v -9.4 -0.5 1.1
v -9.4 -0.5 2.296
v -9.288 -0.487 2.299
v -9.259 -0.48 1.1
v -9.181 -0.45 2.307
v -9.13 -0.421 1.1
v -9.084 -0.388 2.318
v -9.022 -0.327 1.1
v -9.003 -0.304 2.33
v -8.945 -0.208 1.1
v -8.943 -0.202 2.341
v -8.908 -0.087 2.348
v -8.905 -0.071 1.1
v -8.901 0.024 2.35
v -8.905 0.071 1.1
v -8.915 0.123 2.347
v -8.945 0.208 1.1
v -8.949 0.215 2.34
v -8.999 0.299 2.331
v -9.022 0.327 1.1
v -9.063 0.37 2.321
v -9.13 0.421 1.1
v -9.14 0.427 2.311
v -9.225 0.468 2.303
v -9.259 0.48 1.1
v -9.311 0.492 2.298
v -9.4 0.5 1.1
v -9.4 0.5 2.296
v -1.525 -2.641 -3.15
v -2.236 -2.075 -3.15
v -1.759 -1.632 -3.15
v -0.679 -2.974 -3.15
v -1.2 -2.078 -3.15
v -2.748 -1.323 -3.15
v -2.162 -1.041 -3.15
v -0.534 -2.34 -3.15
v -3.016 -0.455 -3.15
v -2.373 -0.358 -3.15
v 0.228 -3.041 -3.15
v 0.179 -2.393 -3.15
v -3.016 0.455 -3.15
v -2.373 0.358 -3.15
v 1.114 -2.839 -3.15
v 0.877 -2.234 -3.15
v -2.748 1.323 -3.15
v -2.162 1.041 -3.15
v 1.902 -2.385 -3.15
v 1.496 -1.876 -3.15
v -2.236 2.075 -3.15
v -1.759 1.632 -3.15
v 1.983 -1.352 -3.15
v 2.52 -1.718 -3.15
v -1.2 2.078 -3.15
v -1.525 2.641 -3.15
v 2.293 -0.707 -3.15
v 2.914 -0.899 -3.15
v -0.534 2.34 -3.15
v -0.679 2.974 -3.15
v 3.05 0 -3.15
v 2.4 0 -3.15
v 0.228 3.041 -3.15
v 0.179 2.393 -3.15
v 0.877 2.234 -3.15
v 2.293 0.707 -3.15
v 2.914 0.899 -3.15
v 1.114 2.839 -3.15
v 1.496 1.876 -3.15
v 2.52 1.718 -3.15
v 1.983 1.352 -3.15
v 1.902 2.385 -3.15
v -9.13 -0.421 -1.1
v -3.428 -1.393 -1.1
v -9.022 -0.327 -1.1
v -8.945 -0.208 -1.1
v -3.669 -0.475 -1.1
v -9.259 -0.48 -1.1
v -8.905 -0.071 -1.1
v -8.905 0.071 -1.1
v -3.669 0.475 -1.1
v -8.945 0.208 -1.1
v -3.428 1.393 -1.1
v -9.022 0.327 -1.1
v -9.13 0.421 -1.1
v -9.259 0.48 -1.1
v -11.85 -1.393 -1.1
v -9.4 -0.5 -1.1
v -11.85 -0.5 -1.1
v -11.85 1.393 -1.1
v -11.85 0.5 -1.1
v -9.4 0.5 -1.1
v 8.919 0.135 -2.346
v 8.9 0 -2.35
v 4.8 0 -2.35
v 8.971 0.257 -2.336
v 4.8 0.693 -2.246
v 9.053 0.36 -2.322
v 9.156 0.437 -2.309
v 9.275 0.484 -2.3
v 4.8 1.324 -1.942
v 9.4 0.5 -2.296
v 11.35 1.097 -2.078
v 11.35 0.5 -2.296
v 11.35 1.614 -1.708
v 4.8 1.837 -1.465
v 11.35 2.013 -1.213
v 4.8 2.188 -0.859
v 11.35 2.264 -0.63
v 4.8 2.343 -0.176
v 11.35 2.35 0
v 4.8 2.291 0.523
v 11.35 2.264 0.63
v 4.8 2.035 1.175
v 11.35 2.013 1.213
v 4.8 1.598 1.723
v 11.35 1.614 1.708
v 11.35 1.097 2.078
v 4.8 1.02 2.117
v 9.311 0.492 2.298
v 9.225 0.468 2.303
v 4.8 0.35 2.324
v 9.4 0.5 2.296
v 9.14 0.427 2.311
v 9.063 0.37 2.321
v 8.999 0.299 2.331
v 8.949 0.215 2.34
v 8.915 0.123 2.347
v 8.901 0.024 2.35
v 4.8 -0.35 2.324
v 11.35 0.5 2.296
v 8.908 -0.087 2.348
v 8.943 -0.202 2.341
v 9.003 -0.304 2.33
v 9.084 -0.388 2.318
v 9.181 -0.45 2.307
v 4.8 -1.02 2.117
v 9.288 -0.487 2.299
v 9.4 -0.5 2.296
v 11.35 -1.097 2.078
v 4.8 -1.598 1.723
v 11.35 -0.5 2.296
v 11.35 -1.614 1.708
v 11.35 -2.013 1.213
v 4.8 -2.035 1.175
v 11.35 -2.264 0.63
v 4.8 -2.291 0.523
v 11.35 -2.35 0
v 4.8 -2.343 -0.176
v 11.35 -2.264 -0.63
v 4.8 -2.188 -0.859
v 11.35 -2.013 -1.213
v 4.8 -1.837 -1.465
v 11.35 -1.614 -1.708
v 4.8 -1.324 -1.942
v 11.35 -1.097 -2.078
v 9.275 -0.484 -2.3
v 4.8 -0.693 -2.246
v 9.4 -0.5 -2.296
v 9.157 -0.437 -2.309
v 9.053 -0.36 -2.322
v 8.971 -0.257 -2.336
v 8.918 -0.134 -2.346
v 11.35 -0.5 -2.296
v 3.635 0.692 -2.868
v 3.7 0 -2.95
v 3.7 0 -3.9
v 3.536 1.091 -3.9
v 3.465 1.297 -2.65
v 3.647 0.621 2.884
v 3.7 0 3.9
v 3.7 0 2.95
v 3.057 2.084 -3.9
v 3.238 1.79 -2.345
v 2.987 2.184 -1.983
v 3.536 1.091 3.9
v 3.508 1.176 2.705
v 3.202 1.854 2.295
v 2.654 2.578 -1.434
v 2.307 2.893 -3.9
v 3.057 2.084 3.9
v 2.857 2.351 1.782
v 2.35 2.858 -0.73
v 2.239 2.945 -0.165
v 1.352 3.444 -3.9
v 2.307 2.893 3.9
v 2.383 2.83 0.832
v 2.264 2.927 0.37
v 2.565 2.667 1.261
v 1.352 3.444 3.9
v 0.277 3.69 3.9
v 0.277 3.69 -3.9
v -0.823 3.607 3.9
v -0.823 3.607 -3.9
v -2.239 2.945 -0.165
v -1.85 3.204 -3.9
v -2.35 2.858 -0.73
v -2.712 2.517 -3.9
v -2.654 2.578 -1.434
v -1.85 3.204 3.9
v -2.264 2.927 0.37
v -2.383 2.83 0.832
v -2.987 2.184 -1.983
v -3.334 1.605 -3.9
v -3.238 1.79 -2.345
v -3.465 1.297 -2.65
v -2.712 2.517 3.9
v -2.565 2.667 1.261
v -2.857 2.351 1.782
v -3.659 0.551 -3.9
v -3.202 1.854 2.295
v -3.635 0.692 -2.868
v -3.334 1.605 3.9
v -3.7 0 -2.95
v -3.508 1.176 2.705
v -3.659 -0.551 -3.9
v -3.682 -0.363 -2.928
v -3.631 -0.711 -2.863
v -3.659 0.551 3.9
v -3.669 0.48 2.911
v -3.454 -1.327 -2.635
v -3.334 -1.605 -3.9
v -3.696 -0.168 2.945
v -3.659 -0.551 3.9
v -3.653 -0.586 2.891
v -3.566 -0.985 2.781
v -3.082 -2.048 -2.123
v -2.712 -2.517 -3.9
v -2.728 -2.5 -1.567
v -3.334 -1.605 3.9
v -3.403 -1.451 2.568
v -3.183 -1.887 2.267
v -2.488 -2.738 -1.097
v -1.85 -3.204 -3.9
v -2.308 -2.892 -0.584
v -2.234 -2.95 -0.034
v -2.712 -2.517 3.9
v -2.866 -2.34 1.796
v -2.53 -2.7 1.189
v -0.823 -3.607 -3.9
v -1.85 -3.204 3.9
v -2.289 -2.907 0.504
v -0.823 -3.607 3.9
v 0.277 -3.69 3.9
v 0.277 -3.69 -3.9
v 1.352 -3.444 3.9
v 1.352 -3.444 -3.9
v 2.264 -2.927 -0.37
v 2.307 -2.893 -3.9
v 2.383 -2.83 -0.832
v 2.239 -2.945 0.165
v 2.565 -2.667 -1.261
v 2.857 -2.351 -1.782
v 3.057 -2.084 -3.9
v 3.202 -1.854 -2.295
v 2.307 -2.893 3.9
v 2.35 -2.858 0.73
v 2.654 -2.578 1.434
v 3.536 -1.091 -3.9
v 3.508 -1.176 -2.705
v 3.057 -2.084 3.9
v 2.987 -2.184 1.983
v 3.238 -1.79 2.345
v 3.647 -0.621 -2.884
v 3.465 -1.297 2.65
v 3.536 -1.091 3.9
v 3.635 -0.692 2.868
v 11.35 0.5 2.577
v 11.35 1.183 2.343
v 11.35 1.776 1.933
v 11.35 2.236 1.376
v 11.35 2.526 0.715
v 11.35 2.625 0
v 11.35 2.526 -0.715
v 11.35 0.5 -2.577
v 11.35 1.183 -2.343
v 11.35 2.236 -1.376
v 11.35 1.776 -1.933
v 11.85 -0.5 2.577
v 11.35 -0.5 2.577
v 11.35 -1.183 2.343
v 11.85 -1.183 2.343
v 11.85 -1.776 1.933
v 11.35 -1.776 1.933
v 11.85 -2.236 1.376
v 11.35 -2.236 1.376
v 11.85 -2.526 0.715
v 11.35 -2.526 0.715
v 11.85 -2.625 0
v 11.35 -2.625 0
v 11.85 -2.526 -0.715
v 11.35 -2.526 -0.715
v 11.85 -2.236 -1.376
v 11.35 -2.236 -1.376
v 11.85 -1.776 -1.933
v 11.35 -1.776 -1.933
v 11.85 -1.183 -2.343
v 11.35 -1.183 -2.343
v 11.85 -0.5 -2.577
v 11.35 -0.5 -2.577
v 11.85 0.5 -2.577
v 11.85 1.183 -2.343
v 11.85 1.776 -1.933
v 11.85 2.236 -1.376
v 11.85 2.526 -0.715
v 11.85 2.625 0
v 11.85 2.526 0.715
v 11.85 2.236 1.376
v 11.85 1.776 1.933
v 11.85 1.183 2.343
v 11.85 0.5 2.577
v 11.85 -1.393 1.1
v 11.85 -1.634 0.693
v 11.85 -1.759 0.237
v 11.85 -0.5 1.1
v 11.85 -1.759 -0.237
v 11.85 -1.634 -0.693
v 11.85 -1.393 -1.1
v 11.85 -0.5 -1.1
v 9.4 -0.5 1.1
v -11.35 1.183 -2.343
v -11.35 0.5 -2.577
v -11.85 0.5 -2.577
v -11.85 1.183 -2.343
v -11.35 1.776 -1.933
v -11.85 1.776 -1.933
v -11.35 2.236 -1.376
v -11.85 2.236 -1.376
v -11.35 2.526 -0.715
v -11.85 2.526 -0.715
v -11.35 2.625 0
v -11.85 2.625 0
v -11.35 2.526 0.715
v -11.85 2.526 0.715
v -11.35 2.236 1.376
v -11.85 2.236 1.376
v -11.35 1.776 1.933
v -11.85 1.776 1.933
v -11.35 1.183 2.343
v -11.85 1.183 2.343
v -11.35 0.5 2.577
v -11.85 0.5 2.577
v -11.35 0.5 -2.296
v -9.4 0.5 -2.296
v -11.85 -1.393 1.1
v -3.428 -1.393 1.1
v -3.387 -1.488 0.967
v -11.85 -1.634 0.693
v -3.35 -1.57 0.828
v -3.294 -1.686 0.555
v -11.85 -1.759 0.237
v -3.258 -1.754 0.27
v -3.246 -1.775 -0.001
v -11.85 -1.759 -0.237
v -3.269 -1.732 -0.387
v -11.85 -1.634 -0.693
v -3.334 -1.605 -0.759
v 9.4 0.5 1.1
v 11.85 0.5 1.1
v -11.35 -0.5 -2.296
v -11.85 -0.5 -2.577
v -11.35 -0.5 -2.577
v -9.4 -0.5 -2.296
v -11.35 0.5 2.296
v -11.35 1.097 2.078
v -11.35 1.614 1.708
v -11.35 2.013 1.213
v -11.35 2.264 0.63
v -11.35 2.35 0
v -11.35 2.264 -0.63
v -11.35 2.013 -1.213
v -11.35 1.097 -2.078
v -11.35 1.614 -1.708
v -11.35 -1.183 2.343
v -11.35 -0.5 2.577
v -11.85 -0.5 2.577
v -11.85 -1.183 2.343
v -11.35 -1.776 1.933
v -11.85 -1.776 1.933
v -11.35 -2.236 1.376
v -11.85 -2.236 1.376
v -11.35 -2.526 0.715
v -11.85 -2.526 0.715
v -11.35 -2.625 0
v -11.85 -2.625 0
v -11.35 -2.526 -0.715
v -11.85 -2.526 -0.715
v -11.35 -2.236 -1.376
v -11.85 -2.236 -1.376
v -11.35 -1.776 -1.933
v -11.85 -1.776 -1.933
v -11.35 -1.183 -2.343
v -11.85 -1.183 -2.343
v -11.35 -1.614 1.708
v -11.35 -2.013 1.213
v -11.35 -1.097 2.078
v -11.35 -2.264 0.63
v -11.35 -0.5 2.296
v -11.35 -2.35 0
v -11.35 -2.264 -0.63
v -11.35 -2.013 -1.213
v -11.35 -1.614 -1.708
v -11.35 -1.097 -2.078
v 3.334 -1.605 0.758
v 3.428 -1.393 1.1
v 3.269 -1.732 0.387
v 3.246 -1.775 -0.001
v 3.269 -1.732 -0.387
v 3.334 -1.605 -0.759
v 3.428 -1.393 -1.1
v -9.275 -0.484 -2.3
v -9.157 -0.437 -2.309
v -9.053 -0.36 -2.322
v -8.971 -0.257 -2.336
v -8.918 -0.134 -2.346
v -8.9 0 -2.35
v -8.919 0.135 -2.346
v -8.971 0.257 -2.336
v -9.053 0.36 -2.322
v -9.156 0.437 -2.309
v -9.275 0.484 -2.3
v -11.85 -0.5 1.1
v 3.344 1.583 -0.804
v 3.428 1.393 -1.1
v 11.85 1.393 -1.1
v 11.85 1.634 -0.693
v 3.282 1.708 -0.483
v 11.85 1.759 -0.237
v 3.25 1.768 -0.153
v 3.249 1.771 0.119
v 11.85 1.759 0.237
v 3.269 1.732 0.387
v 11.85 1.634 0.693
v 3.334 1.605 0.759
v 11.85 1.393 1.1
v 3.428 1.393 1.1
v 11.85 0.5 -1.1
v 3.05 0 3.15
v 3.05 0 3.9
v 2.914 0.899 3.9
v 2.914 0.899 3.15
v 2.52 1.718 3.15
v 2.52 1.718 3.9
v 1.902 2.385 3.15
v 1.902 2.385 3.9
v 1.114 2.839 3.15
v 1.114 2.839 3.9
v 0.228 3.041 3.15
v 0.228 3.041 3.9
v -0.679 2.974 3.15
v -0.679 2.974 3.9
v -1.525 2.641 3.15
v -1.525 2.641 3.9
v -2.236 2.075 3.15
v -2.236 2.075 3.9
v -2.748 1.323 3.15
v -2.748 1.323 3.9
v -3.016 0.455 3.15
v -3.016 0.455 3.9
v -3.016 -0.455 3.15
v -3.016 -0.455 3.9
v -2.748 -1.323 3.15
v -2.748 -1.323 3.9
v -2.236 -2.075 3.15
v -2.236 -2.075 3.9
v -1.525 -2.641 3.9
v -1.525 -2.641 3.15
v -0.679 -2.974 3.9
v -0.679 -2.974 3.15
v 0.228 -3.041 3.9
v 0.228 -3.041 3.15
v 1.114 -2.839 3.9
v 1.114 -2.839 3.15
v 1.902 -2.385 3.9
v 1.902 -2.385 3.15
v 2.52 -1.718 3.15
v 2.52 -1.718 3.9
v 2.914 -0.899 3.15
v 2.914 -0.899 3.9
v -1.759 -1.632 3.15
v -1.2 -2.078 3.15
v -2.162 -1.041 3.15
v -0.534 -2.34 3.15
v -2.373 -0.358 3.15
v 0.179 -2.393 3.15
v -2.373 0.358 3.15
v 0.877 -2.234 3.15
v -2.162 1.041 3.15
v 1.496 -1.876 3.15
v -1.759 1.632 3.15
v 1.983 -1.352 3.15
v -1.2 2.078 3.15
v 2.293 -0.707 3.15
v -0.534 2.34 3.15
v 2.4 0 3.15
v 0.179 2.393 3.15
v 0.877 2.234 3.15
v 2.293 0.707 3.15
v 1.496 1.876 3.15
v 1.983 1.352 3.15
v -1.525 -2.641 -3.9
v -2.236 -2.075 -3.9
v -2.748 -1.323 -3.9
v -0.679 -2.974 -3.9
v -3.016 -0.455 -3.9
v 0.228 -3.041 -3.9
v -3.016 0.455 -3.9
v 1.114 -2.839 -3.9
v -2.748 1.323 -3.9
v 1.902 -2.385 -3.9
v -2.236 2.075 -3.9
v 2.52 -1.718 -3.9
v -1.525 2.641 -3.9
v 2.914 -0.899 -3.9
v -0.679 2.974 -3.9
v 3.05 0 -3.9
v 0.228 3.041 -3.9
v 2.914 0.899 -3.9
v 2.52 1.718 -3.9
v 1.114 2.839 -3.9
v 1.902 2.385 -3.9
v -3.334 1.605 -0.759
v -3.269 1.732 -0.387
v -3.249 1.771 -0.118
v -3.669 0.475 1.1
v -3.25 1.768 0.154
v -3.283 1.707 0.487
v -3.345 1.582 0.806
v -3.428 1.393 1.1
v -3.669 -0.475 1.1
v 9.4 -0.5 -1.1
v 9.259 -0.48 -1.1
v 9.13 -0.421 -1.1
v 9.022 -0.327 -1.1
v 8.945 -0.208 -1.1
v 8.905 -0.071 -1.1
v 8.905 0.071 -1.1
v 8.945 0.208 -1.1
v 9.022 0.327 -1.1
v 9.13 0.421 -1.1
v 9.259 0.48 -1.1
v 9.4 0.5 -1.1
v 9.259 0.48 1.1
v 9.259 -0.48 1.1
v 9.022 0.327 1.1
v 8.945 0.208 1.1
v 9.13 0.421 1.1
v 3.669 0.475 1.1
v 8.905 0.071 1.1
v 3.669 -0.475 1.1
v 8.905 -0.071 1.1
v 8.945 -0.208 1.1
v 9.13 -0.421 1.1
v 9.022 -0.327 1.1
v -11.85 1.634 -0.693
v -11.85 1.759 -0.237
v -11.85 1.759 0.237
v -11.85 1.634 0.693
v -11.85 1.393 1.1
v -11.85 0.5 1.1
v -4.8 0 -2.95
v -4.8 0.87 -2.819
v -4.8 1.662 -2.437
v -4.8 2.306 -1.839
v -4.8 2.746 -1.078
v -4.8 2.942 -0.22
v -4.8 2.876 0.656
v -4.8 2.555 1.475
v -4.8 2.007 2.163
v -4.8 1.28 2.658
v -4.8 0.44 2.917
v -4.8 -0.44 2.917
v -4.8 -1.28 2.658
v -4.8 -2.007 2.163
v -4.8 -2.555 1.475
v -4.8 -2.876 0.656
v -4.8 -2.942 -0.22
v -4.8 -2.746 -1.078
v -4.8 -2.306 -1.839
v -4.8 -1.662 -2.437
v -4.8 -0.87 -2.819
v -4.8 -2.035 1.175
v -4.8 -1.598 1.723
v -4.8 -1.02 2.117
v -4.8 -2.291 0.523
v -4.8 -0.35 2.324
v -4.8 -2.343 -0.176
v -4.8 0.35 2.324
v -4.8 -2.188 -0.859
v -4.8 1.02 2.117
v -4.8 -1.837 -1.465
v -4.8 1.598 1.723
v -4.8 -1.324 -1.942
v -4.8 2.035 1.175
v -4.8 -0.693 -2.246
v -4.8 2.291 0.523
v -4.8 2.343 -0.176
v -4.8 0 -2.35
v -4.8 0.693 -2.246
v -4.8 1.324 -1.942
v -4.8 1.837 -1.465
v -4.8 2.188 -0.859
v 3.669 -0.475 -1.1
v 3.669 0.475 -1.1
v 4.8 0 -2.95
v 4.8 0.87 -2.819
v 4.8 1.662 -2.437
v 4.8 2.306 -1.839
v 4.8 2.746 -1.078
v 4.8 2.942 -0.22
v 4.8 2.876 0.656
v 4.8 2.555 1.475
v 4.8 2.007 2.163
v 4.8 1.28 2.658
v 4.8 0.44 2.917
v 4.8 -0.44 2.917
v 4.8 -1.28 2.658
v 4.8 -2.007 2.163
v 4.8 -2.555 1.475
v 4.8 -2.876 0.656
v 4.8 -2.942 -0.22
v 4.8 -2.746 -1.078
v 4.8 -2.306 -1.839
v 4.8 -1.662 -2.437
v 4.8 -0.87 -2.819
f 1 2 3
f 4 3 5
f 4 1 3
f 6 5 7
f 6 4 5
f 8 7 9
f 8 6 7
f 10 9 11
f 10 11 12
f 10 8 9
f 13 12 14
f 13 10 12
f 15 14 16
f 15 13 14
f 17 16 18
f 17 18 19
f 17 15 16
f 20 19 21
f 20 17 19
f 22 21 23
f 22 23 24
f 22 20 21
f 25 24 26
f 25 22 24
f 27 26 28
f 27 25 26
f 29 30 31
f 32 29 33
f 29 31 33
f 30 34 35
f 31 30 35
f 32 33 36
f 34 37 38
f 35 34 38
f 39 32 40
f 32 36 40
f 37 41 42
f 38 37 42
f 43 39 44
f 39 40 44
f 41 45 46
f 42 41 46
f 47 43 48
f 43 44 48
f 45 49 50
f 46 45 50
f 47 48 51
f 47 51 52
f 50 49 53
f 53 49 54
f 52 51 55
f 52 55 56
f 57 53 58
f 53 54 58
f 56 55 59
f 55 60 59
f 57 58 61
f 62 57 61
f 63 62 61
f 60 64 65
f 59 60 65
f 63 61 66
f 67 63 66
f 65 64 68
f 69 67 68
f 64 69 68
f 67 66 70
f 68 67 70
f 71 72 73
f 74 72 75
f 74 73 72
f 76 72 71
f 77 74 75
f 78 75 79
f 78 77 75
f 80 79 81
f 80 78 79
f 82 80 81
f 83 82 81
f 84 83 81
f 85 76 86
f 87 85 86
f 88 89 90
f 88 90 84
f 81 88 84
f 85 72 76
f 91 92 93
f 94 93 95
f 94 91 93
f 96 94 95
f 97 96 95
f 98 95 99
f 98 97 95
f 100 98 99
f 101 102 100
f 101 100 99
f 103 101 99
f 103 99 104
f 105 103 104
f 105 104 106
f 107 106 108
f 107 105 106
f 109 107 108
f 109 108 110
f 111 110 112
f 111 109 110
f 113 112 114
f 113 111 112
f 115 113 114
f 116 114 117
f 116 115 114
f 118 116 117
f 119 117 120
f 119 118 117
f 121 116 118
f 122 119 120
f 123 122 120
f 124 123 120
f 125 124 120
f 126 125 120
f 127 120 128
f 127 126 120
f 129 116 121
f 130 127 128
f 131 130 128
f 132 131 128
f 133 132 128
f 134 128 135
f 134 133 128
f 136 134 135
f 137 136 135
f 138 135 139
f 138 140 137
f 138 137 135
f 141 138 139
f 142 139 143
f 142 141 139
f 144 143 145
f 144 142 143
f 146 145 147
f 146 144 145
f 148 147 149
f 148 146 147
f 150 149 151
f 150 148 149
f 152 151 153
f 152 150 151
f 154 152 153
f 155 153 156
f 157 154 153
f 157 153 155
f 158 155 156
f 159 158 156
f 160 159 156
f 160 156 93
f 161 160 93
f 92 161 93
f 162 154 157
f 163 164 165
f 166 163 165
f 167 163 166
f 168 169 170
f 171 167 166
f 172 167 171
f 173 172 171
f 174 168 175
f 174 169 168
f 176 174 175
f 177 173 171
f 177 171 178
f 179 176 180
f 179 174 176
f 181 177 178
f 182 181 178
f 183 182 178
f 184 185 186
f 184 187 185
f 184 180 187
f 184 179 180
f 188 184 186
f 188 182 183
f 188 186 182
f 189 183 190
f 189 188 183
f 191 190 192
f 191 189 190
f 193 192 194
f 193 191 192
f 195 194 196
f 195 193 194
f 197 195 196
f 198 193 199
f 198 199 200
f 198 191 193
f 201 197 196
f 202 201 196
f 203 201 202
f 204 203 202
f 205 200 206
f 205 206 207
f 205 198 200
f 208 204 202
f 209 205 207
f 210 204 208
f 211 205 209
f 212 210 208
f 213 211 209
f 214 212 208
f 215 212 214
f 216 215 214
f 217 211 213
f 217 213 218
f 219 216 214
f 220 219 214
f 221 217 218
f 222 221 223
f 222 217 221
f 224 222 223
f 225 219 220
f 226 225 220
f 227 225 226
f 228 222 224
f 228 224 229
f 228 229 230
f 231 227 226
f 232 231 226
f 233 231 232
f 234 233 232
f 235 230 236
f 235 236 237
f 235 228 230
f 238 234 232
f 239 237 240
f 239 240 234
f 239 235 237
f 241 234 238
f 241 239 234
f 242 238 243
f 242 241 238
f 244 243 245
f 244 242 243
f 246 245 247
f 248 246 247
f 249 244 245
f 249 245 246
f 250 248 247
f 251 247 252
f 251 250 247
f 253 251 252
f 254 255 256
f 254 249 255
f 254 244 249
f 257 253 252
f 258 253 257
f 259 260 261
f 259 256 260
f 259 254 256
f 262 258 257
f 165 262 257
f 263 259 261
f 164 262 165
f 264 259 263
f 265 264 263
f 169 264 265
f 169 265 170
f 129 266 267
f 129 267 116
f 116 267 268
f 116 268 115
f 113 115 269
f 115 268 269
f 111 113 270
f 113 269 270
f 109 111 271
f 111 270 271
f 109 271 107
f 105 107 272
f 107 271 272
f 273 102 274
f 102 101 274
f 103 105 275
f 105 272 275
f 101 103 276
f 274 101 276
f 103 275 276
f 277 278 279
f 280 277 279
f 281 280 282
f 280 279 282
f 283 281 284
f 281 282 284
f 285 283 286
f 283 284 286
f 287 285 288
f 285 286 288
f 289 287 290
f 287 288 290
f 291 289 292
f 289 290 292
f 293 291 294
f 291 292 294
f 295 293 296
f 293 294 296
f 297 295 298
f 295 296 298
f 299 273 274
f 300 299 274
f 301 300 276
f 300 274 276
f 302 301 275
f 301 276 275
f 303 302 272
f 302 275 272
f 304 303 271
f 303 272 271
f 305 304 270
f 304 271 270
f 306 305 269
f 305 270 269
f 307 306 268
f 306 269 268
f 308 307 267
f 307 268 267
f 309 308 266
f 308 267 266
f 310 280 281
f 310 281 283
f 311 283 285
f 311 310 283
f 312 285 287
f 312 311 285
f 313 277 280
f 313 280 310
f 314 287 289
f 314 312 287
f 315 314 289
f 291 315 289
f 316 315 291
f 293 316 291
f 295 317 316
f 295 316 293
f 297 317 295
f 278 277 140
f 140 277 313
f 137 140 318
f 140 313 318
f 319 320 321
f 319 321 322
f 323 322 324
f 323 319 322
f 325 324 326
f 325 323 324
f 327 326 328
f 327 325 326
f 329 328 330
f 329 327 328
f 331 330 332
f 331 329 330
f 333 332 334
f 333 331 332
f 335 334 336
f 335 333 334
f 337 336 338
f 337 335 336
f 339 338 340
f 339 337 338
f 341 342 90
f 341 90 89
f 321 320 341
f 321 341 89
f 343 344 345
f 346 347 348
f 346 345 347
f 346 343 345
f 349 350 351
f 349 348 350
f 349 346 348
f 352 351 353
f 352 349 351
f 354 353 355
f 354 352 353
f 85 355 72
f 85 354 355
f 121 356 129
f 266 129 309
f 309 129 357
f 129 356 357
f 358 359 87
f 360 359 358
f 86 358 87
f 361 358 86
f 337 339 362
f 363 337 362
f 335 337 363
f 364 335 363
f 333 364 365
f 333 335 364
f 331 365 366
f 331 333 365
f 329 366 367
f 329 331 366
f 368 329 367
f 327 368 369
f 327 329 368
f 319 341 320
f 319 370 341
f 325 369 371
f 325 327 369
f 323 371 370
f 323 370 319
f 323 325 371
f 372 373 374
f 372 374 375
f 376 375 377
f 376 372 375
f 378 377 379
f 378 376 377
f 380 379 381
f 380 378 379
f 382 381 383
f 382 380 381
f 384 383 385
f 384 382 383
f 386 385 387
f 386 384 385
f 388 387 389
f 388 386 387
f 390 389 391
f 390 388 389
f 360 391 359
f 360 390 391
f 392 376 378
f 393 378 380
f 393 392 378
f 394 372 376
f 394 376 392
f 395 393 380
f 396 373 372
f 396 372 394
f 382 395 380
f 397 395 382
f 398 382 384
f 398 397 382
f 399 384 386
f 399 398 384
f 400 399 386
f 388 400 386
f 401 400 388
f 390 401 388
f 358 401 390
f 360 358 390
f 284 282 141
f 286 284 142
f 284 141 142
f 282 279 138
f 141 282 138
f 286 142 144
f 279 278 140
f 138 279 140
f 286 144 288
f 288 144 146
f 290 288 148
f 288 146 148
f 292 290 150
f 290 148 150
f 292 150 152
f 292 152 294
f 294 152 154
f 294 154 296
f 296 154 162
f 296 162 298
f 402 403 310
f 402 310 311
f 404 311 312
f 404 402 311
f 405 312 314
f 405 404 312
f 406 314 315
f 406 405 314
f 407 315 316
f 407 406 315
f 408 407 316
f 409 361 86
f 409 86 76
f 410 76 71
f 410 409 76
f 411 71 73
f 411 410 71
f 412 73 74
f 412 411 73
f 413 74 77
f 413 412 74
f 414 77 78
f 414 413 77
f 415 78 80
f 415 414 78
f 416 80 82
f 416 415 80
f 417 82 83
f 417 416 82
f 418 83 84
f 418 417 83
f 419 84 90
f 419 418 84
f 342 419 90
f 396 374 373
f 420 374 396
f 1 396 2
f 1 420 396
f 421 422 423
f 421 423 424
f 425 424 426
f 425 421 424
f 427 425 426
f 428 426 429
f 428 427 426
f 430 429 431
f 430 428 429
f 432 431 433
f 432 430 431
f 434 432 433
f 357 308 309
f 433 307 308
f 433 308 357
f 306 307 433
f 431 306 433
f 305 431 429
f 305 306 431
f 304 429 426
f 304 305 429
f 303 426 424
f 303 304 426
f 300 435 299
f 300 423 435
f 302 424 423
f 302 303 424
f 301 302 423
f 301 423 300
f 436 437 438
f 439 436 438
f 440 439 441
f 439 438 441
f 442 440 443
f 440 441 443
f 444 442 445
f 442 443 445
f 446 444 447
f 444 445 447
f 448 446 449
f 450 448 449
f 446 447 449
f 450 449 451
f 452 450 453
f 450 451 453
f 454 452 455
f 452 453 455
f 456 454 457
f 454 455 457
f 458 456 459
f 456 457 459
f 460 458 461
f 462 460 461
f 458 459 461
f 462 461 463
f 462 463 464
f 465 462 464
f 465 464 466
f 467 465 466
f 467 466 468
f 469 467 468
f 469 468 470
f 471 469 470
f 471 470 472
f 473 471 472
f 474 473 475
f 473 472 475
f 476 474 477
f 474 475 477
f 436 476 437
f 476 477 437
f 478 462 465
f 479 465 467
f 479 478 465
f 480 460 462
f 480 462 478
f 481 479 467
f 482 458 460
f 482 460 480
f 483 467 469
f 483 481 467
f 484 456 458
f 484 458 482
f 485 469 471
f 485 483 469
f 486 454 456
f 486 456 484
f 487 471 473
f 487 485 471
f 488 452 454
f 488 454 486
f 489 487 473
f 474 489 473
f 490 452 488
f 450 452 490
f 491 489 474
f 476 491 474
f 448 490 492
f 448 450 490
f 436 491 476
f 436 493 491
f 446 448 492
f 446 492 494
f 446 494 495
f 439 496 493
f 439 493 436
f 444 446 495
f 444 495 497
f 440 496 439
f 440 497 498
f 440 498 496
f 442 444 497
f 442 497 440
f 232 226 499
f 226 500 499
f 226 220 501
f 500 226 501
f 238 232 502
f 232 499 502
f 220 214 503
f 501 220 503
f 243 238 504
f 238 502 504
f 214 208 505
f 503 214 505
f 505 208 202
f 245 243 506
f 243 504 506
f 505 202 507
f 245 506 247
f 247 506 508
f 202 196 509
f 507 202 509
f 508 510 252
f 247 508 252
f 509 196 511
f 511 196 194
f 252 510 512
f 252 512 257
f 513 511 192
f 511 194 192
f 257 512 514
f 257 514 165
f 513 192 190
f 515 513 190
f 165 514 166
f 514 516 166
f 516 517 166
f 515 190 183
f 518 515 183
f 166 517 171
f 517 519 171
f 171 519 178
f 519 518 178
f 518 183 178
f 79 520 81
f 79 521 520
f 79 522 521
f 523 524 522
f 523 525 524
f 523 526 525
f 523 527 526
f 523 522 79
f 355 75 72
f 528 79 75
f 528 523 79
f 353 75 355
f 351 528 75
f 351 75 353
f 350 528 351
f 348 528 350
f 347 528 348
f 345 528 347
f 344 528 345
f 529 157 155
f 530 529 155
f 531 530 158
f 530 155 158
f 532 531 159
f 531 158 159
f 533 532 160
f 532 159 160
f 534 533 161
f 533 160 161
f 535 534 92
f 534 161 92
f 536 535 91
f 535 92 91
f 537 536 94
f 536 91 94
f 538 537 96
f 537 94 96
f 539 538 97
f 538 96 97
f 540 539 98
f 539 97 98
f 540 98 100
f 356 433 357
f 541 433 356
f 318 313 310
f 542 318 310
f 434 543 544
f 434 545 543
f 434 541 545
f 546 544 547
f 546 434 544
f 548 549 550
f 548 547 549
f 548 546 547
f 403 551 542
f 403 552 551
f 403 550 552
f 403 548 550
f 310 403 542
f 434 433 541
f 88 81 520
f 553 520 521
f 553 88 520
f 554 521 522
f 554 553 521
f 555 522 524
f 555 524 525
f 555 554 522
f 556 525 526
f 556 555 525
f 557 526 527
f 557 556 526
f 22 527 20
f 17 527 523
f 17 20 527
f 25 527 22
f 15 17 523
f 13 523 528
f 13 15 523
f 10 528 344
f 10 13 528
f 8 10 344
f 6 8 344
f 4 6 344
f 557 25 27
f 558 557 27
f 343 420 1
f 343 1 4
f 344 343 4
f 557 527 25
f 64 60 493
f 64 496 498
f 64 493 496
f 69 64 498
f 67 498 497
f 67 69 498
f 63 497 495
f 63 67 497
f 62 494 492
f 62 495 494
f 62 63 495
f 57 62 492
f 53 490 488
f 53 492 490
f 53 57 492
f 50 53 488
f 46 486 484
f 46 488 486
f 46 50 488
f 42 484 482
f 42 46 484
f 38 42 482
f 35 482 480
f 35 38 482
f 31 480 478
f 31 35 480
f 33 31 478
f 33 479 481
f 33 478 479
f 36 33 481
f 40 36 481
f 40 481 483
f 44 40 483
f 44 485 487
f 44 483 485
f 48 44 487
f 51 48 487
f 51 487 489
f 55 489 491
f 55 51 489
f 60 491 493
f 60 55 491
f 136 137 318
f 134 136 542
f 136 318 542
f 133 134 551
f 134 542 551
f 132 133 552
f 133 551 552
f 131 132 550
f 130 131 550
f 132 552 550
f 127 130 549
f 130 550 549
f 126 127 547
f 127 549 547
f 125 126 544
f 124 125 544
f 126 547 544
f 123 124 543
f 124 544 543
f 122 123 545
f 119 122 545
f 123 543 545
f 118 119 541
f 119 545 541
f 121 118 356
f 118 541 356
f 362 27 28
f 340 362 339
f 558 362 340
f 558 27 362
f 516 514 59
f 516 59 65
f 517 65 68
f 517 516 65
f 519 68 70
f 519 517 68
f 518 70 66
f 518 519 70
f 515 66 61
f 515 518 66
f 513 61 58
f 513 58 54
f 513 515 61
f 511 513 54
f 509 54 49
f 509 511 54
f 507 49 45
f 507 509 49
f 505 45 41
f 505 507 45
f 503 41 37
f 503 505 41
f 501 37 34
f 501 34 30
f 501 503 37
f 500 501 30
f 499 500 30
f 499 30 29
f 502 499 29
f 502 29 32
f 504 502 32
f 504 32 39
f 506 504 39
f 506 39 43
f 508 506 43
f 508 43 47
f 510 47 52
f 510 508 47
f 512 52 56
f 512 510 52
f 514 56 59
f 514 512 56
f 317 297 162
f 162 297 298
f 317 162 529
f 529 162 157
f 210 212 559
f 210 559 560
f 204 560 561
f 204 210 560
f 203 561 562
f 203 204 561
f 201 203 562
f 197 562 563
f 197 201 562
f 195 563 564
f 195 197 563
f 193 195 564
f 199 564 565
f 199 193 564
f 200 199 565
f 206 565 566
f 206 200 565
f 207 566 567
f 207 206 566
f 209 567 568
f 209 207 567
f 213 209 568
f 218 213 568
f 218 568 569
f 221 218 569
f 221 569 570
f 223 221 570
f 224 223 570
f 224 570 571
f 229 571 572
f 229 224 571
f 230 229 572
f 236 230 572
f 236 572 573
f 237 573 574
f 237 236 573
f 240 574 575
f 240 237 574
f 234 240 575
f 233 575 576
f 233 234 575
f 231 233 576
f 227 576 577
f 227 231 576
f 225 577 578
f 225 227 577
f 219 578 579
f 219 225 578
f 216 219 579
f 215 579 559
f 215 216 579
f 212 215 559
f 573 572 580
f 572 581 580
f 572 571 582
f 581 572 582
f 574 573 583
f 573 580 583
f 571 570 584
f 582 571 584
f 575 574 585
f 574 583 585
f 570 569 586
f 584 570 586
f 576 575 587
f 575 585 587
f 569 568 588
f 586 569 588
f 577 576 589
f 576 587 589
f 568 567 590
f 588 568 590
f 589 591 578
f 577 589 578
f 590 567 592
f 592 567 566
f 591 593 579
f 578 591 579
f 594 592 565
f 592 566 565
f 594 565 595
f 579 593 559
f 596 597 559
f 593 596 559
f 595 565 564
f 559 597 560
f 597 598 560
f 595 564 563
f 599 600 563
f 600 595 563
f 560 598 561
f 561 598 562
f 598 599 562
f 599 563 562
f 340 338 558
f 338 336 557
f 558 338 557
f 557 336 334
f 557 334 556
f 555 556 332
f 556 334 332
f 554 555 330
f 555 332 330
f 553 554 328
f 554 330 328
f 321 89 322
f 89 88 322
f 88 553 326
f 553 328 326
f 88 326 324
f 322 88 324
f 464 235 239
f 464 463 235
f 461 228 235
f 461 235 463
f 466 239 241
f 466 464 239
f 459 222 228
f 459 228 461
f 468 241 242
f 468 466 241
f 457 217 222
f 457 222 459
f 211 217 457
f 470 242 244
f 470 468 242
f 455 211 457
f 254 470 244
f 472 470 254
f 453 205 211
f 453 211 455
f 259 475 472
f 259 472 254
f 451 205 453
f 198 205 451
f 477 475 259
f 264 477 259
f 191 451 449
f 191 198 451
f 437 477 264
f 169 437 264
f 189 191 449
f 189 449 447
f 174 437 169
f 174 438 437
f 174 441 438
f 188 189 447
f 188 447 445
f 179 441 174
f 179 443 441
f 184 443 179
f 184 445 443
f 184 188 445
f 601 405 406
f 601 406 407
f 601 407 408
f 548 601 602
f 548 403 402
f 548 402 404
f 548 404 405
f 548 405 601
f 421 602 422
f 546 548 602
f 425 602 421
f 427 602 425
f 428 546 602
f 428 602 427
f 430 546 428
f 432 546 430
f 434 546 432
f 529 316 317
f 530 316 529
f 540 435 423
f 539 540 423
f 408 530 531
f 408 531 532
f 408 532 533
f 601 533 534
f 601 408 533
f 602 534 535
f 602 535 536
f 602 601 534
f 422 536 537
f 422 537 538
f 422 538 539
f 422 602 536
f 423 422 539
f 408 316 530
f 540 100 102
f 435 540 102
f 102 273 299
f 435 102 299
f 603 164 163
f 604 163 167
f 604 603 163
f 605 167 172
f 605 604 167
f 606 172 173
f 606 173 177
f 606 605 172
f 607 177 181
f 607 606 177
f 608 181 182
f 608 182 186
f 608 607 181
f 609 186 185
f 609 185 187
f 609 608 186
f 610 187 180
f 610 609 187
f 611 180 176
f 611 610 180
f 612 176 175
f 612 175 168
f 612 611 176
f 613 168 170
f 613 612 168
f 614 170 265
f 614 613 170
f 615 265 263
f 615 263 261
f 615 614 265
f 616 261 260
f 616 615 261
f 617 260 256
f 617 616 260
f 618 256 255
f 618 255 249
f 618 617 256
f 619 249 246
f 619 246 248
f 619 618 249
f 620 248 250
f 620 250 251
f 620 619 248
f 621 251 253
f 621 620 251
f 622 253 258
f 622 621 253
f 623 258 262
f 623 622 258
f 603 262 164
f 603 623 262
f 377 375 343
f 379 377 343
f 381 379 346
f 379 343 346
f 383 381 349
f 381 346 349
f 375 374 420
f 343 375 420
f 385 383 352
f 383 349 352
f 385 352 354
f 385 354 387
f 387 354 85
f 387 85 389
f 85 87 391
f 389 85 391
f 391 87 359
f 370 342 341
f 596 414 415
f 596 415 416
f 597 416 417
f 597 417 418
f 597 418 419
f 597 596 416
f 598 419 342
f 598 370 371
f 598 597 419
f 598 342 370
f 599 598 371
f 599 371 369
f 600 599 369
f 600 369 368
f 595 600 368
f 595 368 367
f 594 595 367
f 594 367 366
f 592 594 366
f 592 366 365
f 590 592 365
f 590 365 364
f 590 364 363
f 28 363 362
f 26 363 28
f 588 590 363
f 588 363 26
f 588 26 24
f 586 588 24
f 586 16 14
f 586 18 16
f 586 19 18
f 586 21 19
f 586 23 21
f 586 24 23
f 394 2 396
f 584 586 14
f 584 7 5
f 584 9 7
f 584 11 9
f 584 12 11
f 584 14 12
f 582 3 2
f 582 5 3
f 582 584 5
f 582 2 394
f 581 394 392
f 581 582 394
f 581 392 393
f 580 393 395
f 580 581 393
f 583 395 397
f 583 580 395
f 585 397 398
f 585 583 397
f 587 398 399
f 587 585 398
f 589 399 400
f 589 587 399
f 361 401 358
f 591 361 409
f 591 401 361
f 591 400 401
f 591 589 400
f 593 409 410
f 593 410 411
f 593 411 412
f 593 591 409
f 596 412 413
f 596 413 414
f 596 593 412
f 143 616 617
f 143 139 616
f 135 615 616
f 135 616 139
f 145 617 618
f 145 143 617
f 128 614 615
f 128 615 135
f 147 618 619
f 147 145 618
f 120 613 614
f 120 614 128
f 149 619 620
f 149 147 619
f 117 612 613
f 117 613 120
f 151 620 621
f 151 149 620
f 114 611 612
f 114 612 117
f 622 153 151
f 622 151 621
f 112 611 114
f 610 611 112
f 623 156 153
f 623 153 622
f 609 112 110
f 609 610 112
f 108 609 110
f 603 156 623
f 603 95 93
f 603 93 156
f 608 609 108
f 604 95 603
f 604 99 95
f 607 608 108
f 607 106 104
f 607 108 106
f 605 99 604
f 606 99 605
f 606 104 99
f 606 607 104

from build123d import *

# Parameters (mm, degrees)
SKETCH1_R              = 2.35
PIN_DEPTH              = 11.35
SKETCH2_R              = 2.95
MIDDLE_DEPTH           = 4.8
SKETCH3_R              = 2.625
OUTER_RIM_DEPTH        = 0.5
BORE_CUT_DEPTH         = 13.562941535
BORE_CUT_DEPTH_BACK    = 13.562941535
SLOT_CUT_DEPTH         = 13.562941535
SLOT_CUT_DEPTH_BACK    = 13.562941535
SKETCH6_R              = 3.7
MIDDLE_BODY_DEPTH      = 3.9
MIDDLE_BORE_DEPTH      = 14.012398084
MIDDLE_BORE_DEPTH_BACK = 14.012398084
SKETCH7_R              = 2.4
SKETCH8_R              = 3.05
MIDDLE_RIM_CUT_DEPTH   = 0.75


with BuildPart() as part:
    # Sketch1 → Pin (new, symmetric)
    with BuildSketch(Plane(origin=(0, 0, 0), x_dir=(0, 0, -1), z_dir=(1, 0, 0))):
        Circle(SKETCH1_R)
    extrude(amount=PIN_DEPTH, both=True)

    # Sketch2 → Middle (add, symmetric)
    with BuildSketch(Plane(origin=(0, 0, 0), x_dir=(0, 0, -1), z_dir=(1, 0, 0))):
        Circle(SKETCH2_R)
    extrude(amount=MIDDLE_DEPTH, both=True)

    # Sketch3 → Outer Rim (add)
    with BuildSketch(Plane(origin=(11.35, 0, 0), x_dir=(0, 0, -1), z_dir=(1, 0, 0))):
        Circle(SKETCH3_R)
    outer_rim = extrude(amount=OUTER_RIM_DEPTH)

    # Mirror1: Outer Rim across plane
    add(outer_rim.mirror(Plane(origin=(0, 0, 0), x_dir=(0, 0, 1), z_dir=(1, 0, 0))))

    # Sketch4 → Bore Cut (cut, two sides: drawn at the far end of the back side and taken through both)
    with BuildSketch(Plane(origin=(0, 0, 0), x_dir=(0, 0, -1), z_dir=(1, 0, 0)).offset(-BORE_CUT_DEPTH_BACK)):
        with BuildLine():
            ThreePointArc((-1.1, -1.393063172), (0, -1.775), (1.1, -1.393063172))
            Line((1.1, -1.393063172), (1.1, 1.393063172))
            ThreePointArc((1.1, 1.393063172), (0, 1.775), (-1.1, 1.393063172))
            Line((-1.1, 1.393063172), (-1.1, -1.393063172))
        make_face()
    extrude(amount=BORE_CUT_DEPTH + BORE_CUT_DEPTH_BACK, mode=Mode.SUBTRACT)

    # Sketch5 → Slot Cut (cut, two sides: drawn at the far end of the back side and taken through both)
    with BuildSketch(Plane.XY.offset(-SLOT_CUT_DEPTH_BACK)):
        with BuildLine():
            Line((14.3, -0.5), (9.4, -0.5))
            ThreePointArc((9.4, -0.5), (8.9, 0), (9.4, 0.5))
            Line((9.4, 0.5), (14.3, 0.5))
            ThreePointArc((14.3, 0.5), (14.8, 0), (14.3, -0.5))
        make_face()
        with BuildLine():
            Line((-14.3, -0.5), (-9.4, -0.5))
            ThreePointArc((-9.4, -0.5), (-8.9, 0), (-9.4, 0.5))
            Line((-9.4, 0.5), (-14.3, 0.5))
            ThreePointArc((-14.3, 0.5), (-14.8, 0), (-14.3, -0.5))
        make_face()
    extrude(amount=SLOT_CUT_DEPTH + SLOT_CUT_DEPTH_BACK, mode=Mode.SUBTRACT)

    # Sketch6 → Middle Body (add, symmetric)
    with BuildSketch(Plane.XY):
        Circle(SKETCH6_R)
    extrude(amount=MIDDLE_BODY_DEPTH, both=True)

    # Sketch7 → Middle Bore (cut, two sides: drawn at the far end of the back side and taken through both)
    with BuildSketch(Plane.XY.offset(-MIDDLE_BORE_DEPTH_BACK)):
        Circle(SKETCH7_R)
    extrude(amount=MIDDLE_BORE_DEPTH + MIDDLE_BORE_DEPTH_BACK, mode=Mode.SUBTRACT)

    # Sketch8 → Middle Rim Cut (cut)
    with BuildSketch(Plane.XY.offset(3.9)):
        Circle(SKETCH8_R)
    middle_rim_cut = extrude(amount=-MIDDLE_RIM_CUT_DEPTH, mode=Mode.SUBTRACT)

    # Mirror2: Middle Rim Cut across plane
    add(middle_rim_cut.mirror(Plane.XY), mode=Mode.SUBTRACT)


solid = part.part
